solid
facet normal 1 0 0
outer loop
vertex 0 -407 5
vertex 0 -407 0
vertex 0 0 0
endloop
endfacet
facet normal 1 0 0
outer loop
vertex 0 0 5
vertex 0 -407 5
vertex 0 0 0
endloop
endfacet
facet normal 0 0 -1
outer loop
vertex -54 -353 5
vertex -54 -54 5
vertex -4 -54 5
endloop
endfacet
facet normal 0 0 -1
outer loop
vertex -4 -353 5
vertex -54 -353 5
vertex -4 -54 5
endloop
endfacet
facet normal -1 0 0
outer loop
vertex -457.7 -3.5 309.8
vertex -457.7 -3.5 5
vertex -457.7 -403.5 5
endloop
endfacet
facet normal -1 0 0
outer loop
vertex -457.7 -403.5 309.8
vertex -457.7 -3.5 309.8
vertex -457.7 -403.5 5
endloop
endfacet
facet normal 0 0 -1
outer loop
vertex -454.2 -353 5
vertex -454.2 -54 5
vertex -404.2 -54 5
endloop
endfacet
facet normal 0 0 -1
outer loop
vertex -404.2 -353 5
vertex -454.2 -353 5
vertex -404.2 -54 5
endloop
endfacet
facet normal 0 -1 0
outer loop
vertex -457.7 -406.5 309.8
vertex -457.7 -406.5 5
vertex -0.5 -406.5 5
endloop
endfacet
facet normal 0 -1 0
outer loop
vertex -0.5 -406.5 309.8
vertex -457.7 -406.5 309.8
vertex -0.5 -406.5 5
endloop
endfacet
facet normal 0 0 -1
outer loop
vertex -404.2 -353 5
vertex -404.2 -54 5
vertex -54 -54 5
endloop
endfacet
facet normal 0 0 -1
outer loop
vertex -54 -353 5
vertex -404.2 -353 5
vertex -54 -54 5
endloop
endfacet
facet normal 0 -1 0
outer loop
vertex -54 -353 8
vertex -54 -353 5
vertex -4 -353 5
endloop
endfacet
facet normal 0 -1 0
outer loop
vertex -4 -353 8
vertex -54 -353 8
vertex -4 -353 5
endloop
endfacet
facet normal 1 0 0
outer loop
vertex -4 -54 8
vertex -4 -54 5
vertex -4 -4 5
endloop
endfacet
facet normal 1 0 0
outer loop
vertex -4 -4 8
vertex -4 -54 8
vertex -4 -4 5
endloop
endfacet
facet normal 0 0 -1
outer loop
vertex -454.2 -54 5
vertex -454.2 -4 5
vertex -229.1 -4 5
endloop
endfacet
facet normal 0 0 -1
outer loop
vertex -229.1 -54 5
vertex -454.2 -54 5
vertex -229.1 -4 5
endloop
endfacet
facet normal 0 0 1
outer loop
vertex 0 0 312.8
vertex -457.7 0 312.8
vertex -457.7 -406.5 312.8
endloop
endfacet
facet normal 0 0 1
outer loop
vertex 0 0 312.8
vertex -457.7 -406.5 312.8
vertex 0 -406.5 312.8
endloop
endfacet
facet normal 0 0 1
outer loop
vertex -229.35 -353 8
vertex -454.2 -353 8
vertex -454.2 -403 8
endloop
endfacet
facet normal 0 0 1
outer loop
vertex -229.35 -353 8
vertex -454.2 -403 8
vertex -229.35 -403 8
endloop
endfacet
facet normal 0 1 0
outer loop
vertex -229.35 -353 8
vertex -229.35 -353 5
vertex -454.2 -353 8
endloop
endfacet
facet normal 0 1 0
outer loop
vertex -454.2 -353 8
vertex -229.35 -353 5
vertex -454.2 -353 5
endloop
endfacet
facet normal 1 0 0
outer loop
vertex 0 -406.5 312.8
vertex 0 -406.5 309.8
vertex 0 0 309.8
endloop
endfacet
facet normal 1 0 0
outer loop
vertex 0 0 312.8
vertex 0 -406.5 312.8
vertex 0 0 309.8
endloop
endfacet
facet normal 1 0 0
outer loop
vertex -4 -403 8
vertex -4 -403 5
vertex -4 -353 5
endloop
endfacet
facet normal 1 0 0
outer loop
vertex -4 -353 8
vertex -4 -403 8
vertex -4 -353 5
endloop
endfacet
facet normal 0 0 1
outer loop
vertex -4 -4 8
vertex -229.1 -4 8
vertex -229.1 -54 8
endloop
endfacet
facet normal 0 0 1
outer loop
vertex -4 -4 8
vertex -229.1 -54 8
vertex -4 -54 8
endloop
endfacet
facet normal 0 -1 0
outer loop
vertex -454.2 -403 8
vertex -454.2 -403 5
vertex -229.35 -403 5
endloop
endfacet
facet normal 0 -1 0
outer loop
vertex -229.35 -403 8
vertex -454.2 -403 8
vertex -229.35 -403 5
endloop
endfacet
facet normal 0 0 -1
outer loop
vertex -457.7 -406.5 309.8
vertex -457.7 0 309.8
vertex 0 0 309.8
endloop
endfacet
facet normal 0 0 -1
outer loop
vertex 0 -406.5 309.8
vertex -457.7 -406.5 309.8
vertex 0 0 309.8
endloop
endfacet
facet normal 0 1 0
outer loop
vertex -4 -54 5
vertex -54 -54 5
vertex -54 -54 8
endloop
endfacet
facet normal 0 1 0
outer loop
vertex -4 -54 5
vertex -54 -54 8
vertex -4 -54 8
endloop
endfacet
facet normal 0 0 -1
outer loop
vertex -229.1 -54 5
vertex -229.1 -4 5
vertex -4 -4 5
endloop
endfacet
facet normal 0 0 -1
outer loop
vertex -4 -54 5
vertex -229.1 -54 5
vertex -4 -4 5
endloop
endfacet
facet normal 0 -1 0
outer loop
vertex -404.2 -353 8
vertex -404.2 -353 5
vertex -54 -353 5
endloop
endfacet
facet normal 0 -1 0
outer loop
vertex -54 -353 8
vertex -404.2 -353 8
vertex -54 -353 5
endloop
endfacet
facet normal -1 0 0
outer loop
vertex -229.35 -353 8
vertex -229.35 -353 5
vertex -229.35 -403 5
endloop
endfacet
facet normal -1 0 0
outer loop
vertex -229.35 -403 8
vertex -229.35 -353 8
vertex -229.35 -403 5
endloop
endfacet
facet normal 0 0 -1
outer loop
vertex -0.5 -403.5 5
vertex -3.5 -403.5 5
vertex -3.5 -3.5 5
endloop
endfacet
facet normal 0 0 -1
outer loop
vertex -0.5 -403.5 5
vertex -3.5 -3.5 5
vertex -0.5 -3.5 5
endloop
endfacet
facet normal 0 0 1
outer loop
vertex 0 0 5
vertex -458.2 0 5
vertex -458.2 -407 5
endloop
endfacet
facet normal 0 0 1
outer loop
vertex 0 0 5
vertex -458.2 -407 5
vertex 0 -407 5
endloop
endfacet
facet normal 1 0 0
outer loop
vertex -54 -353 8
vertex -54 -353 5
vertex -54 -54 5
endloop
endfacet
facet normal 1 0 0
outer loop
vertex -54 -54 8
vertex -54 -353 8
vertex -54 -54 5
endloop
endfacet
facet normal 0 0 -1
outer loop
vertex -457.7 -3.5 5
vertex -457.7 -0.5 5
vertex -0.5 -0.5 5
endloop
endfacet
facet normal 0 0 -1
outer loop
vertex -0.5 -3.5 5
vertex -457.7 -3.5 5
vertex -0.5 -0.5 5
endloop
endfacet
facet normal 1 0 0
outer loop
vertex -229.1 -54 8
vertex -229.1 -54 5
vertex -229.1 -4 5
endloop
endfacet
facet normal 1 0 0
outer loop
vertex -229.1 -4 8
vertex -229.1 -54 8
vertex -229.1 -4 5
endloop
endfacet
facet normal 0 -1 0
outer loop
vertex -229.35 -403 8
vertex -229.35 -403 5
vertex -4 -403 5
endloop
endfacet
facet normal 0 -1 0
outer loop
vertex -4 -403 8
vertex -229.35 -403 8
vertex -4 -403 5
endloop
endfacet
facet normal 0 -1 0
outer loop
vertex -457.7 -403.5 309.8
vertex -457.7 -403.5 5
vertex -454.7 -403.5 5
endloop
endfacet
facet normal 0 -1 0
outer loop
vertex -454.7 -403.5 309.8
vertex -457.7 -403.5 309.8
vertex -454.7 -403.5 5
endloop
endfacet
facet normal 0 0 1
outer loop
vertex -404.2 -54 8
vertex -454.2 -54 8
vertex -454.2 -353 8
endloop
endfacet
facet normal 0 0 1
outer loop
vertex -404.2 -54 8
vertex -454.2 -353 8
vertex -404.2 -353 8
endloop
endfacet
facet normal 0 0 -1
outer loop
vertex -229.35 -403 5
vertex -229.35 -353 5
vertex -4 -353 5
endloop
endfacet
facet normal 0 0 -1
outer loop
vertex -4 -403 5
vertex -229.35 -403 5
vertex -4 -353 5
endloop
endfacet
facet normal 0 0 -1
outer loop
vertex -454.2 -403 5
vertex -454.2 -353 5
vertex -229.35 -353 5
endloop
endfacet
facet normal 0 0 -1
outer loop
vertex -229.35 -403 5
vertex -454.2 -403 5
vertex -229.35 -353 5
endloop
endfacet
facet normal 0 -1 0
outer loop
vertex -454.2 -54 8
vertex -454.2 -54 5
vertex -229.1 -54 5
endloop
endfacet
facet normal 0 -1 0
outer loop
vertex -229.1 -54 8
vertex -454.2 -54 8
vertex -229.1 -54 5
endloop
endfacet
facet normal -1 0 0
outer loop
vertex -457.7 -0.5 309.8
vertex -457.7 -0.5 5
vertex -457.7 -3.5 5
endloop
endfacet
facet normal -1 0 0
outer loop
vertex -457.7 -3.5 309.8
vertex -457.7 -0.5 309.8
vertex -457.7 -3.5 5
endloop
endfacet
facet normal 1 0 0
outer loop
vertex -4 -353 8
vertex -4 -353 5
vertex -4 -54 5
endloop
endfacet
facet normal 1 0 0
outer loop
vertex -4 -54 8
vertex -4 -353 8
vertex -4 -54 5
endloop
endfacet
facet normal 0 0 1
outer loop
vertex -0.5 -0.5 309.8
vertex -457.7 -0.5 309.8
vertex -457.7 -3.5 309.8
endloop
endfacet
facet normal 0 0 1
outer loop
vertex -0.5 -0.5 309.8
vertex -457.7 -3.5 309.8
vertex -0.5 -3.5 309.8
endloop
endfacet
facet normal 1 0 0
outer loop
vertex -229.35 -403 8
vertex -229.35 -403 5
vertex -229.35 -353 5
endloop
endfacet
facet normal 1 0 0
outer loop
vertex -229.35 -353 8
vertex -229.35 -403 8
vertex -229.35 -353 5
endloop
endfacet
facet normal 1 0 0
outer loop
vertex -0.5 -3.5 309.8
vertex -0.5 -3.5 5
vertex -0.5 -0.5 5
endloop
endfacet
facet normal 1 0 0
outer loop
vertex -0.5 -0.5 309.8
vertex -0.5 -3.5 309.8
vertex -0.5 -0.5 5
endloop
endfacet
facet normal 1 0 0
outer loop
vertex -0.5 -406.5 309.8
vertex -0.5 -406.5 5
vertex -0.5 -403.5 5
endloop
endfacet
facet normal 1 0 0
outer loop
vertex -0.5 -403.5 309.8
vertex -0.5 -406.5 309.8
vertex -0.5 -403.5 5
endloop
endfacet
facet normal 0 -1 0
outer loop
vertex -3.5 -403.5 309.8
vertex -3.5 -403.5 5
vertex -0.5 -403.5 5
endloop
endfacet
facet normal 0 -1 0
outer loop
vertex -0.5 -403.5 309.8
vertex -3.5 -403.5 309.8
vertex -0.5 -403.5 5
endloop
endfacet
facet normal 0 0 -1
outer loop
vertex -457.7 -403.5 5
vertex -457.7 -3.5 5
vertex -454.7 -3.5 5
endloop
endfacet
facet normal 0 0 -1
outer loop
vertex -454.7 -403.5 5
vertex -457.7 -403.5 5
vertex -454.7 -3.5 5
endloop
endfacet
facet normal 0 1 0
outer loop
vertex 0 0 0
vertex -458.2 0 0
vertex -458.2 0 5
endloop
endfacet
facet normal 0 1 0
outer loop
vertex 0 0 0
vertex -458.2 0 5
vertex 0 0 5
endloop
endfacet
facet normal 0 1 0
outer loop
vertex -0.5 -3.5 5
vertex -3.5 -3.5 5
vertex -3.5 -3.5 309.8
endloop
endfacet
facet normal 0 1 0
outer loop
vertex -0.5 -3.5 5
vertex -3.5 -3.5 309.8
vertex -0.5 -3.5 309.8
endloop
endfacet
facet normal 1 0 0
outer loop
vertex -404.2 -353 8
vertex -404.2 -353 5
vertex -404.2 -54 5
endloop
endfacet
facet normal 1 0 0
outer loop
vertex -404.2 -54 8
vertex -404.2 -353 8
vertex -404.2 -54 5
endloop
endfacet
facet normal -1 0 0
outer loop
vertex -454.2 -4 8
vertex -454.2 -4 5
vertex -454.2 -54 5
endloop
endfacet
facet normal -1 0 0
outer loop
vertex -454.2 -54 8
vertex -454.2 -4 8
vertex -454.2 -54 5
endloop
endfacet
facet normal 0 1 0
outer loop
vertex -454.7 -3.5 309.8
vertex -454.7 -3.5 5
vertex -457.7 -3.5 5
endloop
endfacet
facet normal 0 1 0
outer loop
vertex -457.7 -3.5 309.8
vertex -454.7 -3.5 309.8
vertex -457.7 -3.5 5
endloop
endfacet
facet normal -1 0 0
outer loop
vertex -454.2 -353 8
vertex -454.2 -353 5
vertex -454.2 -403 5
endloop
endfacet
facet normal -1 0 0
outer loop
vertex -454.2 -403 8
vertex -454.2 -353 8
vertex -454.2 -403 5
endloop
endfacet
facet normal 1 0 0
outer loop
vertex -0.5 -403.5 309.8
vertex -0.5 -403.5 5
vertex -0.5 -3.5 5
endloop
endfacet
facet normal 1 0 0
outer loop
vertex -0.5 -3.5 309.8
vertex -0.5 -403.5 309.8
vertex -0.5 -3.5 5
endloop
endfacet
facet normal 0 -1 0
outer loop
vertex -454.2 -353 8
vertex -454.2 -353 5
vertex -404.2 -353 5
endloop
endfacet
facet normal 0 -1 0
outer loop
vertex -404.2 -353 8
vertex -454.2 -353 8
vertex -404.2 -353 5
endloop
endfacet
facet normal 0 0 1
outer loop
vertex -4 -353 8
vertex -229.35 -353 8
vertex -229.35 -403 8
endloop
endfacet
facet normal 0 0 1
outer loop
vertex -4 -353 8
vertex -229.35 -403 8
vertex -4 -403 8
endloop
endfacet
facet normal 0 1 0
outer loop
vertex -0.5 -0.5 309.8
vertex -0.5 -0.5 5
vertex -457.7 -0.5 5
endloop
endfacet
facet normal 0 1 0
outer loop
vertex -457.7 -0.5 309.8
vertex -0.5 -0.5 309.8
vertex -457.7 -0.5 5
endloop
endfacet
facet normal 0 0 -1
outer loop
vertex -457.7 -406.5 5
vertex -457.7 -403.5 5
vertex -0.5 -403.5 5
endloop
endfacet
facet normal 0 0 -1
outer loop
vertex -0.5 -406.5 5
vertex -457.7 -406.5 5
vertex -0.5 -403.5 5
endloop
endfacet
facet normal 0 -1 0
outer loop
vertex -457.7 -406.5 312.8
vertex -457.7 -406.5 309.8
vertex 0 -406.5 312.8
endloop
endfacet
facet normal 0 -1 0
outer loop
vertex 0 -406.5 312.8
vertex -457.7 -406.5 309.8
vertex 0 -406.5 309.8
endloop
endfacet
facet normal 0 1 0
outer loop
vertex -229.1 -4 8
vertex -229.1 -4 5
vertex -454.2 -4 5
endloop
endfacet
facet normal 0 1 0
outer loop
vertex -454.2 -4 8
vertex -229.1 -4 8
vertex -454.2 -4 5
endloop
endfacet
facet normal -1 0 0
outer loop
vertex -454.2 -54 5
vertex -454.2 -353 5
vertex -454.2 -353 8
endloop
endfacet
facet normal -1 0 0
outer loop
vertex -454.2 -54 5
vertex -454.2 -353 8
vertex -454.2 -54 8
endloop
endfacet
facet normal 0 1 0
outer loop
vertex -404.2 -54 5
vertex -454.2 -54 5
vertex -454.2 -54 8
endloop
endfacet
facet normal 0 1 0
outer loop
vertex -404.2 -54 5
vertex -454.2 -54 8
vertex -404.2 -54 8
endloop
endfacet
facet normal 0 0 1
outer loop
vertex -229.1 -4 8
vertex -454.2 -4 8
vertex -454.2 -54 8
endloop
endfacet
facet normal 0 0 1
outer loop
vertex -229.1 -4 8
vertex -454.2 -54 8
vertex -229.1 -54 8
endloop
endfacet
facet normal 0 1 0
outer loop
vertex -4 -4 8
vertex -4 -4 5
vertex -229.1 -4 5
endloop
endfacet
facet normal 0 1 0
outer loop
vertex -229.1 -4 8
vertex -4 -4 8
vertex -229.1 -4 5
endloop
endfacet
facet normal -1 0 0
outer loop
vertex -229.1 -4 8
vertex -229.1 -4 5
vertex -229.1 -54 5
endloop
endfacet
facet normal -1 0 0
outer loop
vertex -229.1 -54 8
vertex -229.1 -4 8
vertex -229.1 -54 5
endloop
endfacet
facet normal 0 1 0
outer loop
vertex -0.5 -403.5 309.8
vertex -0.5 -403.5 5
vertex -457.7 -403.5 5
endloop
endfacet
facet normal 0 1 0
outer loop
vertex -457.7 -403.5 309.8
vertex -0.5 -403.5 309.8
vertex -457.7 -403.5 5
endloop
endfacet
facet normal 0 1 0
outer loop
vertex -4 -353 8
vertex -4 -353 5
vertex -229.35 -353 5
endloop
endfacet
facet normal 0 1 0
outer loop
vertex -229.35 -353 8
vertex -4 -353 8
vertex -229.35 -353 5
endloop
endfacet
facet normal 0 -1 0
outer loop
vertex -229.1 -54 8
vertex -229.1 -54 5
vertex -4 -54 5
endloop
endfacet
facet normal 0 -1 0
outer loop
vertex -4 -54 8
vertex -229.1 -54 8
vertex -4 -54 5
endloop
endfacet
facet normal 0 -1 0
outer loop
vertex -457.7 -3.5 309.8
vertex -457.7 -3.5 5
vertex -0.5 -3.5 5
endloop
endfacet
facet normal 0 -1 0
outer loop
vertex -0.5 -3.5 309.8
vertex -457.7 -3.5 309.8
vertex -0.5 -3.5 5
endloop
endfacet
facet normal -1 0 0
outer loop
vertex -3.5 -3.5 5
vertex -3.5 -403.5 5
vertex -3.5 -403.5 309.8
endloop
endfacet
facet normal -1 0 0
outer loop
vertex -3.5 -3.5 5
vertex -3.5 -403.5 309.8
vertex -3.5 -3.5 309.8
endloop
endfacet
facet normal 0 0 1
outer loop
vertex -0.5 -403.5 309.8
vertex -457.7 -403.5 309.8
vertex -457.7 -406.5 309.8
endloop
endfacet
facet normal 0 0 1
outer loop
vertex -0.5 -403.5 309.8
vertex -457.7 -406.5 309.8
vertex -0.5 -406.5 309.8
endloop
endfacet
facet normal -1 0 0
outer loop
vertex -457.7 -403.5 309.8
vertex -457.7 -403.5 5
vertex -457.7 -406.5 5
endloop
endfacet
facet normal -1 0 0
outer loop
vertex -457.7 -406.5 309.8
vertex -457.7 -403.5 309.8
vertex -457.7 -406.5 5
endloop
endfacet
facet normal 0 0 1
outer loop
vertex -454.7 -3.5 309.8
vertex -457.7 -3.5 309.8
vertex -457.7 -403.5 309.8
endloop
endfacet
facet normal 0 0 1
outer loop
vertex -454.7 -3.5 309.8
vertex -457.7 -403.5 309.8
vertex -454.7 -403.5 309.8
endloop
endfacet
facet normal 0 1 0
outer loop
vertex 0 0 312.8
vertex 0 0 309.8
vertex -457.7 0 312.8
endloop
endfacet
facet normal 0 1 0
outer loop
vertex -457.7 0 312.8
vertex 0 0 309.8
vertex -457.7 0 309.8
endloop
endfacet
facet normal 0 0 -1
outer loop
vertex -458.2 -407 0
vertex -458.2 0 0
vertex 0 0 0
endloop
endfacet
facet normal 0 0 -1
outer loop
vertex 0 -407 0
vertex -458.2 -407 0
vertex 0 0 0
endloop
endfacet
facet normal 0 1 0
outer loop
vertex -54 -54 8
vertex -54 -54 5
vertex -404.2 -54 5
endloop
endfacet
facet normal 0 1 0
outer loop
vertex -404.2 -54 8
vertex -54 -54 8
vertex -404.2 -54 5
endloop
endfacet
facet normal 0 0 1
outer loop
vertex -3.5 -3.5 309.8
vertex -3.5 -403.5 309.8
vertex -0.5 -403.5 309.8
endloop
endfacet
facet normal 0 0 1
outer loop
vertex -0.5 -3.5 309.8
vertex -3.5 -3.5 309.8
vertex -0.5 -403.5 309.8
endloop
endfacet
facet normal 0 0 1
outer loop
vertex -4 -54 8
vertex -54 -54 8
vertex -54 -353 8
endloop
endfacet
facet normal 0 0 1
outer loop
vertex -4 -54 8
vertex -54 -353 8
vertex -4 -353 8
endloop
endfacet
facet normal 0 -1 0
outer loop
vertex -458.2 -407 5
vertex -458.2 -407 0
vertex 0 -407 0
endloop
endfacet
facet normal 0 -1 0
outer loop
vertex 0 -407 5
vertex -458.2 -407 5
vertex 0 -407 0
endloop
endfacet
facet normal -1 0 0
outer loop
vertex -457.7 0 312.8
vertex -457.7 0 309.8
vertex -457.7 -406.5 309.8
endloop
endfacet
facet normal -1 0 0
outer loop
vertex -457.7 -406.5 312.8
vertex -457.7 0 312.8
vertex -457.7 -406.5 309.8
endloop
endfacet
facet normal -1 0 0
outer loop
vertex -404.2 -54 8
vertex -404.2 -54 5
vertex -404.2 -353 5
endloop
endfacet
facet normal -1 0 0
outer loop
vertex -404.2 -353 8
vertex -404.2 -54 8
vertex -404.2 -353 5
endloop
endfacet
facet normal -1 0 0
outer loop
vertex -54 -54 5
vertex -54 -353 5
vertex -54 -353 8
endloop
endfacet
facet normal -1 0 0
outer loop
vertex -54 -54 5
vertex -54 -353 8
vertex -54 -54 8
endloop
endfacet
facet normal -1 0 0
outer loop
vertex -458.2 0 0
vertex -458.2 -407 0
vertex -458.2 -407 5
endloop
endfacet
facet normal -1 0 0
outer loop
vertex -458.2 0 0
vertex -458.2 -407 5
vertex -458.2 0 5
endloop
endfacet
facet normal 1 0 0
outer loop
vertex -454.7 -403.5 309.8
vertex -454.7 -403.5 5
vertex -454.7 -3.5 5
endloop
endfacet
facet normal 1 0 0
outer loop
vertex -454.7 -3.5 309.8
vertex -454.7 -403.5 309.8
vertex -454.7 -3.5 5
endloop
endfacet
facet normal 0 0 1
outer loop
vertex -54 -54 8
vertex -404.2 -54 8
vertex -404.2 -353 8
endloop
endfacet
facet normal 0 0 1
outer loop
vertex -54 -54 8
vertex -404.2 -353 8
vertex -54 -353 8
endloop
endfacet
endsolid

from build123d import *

# Parameters (mm, degrees)
F3_W      = 458.2
F3_H      = 407
F3_W_2    = 457.2
F3_H_2    = 406
F5_DEPTH  = 5
F7_DEPTH  = 304.8
F6_W      = 3
F6_H      = 400
F8_DEPTH  = 304.8
F9_DEPTH  = 3
F6_W_2    = 50
F6_H_2    = 299
F10_DEPTH = 3
F11_DEPTH = 3
F12_W     = 457.2
F12_H     = 3
F13_DEPTH = 3


with BuildPart() as f5:
    # F3 (on Top) → F5 (new body)
    with BuildSketch(Plane.XY):
        with Locations((-229.1, -203.5)):
            Rectangle(F3_W, F3_H)
        with Locations((-229.1, -203.5)):
            Rectangle(F3_W_2, F3_H_2, mode=Mode.SUBTRACT)
        with Locations((-229.1, -203.5)):
            Rectangle(F3_W_2, F3_H_2)
    extrude(amount=F5_DEPTH)


with BuildPart() as f7:
    # F6 (on face) → F7 (new body)
    with BuildSketch(Plane.XY.offset(5)):
        Polygon((-457.7, -3.5), (-457.7, -403.5), (-454.7, -403.5), (-454.7, -353), (-454.7, -3.5), align=None)
    extrude(amount=F7_DEPTH)


with BuildPart() as f7b:
    # F6 (on face) → F7, piece 2 (new body)
    with BuildSketch(Plane.XY.offset(5)):
        with Locations((-2, -203.5)):
            Rectangle(F6_W, F6_H)
    extrude(amount=F7_DEPTH)


with BuildPart() as f8:
    # F6 (on face) → F8 (new body)
    with BuildSketch(Plane.XY.offset(5)):
        Polygon((-457.7, -403.5), (-457.7, -406.5), (-0.5, -406.5), (-0.5, -403.5), (-3.5, -403.5), (-454.7, -403.5), align=None)
    extrude(amount=F8_DEPTH)


with BuildPart() as f8b:
    # F6 (on face) → F8, piece 2 (new body)
    with BuildSketch(Plane.XY.offset(5)):
        Polygon((-457.7, -0.5), (-457.7, -3.5), (-454.7, -3.5), (-3.5, -3.5), (-0.5, -3.5), (-0.5, -0.5), align=None)
    extrude(amount=F8_DEPTH)


with BuildPart() as f9:
    # F6 (on face) → F9 (new body)
    with BuildSketch(Plane.XY.offset(5)):
        Polygon((-229.35, -353), (-229.35, -403), (-4, -403), (-4, -353), (-54, -353), align=None)
    extrude(amount=F9_DEPTH)


with BuildPart() as f9b:
    # F6 (on face) → F9, piece 2 (new body)
    with BuildSketch(Plane.XY.offset(5)):
        Polygon((-4, -4), (-229.1, -4), (-229.1, -54), (-54, -54), (-4, -54), align=None)
    extrude(amount=F9_DEPTH)


with BuildPart() as f9c:
    # F6 (on face) → F9, piece 3 (new body)
    with BuildSketch(Plane.XY.offset(5)):
        with Locations((-429.2, -203.5)):
            Rectangle(F6_W_2, F6_H_2)
    extrude(amount=F9_DEPTH)


with BuildPart() as f10:
    # F6 (on face) → F10 (new body)
    with BuildSketch(Plane.XY.offset(5)):
        with Locations((-29, -203.5)):
            Rectangle(F6_W_2, F6_H_2)
    extrude(amount=F10_DEPTH)


with BuildPart() as f10b:
    # F6 (on face) → F10, piece 2 (new body)
    with BuildSketch(Plane.XY.offset(5)):
        Polygon((-404.2, -353), (-454.2, -353), (-454.2, -403), (-229.35, -403), (-229.35, -353), align=None)
    extrude(amount=F10_DEPTH)


with BuildPart() as f10c:
    # F6 (on face) → F10, piece 3 (new body)
    with BuildSketch(Plane.XY.offset(5)):
        Polygon((-454.2, -4), (-454.2, -54), (-404.2, -54), (-229.1, -54), (-229.1, -4), align=None)
    extrude(amount=F10_DEPTH)


with BuildPart() as f11:
    # F6 (on face) → F11 (new body)
    with BuildSketch(Plane.XY.offset(5)):
        Polygon((-404.2, -54), (-404.2, -353), (-229.35, -353), (-54, -353), (-54, -54), (-229.1, -54), align=None)
    extrude(amount=F11_DEPTH)


with BuildPart() as f13:
    # F12 (on face) → F13 (new body)
    with BuildSketch(Plane.XY.offset(309.8)):
        Polygon((-0.5, -403.5), (-0.5, -406.5), (0, -406.5), (0, 0), (-457.7, 0), (-457.7, -403.5), align=None)
        with Locations((-229.1, -405)):
            Rectangle(F12_W, F12_H)
    extrude(amount=F13_DEPTH)


solid = Compound([f5.part, f7.part, f7b.part, f8.part, f8b.part, f9.part, f9b.part, f9c.part, f10.part, f10b.part, f10c.part, f11.part, f13.part])
